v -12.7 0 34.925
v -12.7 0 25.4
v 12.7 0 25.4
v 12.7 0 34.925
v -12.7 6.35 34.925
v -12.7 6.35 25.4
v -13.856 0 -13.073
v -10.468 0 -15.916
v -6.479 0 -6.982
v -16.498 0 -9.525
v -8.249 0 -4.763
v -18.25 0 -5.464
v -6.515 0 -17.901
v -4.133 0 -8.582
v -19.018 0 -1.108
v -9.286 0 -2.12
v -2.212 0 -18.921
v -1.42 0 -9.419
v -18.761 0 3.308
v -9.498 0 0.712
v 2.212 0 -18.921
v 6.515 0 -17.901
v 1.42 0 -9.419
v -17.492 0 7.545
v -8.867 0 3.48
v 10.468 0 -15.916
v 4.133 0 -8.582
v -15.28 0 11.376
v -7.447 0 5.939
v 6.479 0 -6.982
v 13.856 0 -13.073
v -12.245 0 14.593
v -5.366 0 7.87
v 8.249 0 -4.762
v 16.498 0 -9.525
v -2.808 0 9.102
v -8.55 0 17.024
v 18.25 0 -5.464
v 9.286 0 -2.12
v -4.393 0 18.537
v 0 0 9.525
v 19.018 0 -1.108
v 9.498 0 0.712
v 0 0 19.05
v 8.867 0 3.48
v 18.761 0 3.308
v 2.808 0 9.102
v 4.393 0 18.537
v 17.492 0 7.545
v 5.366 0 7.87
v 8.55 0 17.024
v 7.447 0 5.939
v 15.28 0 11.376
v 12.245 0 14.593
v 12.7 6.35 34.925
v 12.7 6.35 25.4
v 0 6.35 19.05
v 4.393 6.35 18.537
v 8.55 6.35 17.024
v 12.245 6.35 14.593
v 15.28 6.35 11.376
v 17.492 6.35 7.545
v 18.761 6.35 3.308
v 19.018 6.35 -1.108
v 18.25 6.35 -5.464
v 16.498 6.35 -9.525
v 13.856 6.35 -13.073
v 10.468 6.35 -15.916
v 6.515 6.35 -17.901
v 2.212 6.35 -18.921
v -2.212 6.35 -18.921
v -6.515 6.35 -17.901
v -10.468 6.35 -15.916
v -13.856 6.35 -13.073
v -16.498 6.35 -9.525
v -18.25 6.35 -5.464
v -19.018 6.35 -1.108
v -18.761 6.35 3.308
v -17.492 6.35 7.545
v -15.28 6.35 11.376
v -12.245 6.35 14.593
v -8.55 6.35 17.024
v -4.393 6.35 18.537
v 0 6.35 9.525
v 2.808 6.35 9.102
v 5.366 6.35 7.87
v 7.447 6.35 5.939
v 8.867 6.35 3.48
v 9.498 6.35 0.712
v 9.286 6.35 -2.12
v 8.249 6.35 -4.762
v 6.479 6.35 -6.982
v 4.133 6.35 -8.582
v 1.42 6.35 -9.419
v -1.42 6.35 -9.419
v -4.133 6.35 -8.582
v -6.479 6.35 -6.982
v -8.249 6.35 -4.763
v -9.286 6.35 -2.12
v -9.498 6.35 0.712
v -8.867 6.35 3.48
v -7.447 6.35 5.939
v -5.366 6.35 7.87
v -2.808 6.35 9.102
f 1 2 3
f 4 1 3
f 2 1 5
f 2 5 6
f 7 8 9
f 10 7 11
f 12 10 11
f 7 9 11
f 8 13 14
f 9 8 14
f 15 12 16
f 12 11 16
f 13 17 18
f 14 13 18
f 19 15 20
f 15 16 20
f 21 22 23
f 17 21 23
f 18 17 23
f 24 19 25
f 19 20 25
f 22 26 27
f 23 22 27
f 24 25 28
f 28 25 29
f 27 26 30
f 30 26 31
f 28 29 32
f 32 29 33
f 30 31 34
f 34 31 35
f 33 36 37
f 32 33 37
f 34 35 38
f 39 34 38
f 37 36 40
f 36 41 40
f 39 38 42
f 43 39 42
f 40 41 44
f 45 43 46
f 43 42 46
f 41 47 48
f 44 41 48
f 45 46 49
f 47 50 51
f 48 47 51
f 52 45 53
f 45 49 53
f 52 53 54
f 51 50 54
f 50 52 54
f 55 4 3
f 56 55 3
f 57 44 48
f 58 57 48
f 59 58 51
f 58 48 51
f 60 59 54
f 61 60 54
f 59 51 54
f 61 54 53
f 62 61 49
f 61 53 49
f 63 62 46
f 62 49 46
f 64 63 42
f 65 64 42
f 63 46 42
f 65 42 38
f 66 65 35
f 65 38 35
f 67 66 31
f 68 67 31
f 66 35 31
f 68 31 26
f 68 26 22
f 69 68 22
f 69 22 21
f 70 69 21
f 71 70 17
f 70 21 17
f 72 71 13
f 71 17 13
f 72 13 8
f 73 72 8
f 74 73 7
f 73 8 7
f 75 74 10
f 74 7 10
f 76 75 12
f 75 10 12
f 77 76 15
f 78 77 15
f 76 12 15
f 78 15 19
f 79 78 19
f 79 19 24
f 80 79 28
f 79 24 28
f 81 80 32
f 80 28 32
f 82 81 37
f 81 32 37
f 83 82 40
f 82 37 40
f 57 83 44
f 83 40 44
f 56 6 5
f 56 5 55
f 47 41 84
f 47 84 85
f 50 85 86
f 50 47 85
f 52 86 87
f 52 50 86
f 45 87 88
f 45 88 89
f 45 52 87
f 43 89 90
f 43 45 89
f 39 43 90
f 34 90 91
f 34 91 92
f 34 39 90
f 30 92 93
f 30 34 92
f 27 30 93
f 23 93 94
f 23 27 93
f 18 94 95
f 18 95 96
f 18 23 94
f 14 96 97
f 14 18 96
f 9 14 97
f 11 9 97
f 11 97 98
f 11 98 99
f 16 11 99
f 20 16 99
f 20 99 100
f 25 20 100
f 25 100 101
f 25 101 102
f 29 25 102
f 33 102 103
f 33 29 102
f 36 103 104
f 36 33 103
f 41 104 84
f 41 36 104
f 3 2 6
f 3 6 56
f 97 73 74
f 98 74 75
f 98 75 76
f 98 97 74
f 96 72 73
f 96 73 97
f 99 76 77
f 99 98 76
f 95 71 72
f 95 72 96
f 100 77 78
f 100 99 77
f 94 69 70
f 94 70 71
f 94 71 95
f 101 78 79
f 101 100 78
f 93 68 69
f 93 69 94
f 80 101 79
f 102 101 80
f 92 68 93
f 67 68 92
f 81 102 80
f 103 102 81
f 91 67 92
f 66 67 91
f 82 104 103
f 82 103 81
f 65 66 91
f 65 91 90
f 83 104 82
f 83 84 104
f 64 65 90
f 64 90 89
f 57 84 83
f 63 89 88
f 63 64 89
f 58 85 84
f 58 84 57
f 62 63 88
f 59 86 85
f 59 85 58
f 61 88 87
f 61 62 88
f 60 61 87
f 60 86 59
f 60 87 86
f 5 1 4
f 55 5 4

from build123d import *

# Parameters (mm, degrees)
SKETCH1_R             = 19.05
SKETCH1_R_2           = 9.525
BOSS_EXTRUDE1_DEPTH   = 6.35
SKETCH1_W             = 25.4
SKETCH1_H             = 9.525
BOSS_EXTRUDE1_2_DEPTH = 6.35


with BuildPart() as part:
    # Sketch1 → Boss-Extrude1 (new body)
    with BuildSketch(Plane(origin=(0, 0, 0), x_dir=(1, 0, 0), z_dir=(0, 1, 0))):
        with Locations(Location((0, 0, 0), (0, 0, 270))):
            Circle(SKETCH1_R)
        with Locations(Location((0, 0, 0), (0, 0, 270))):
            Circle(SKETCH1_R_2, mode=Mode.SUBTRACT)
    extrude(amount=BOSS_EXTRUDE1_DEPTH)


with BuildPart() as body_2:
    # Sketch1 → Boss-Extrude1 2 (new body)
    with BuildSketch(Plane(origin=(0, 0, 0), x_dir=(1, 0, 0), z_dir=(0, 1, 0))):
        with Locations((0, -30.1625)):
            Rectangle(SKETCH1_W, SKETCH1_H)
    extrude(amount=BOSS_EXTRUDE1_2_DEPTH)


solid = Compound([part.part, body_2.part])
